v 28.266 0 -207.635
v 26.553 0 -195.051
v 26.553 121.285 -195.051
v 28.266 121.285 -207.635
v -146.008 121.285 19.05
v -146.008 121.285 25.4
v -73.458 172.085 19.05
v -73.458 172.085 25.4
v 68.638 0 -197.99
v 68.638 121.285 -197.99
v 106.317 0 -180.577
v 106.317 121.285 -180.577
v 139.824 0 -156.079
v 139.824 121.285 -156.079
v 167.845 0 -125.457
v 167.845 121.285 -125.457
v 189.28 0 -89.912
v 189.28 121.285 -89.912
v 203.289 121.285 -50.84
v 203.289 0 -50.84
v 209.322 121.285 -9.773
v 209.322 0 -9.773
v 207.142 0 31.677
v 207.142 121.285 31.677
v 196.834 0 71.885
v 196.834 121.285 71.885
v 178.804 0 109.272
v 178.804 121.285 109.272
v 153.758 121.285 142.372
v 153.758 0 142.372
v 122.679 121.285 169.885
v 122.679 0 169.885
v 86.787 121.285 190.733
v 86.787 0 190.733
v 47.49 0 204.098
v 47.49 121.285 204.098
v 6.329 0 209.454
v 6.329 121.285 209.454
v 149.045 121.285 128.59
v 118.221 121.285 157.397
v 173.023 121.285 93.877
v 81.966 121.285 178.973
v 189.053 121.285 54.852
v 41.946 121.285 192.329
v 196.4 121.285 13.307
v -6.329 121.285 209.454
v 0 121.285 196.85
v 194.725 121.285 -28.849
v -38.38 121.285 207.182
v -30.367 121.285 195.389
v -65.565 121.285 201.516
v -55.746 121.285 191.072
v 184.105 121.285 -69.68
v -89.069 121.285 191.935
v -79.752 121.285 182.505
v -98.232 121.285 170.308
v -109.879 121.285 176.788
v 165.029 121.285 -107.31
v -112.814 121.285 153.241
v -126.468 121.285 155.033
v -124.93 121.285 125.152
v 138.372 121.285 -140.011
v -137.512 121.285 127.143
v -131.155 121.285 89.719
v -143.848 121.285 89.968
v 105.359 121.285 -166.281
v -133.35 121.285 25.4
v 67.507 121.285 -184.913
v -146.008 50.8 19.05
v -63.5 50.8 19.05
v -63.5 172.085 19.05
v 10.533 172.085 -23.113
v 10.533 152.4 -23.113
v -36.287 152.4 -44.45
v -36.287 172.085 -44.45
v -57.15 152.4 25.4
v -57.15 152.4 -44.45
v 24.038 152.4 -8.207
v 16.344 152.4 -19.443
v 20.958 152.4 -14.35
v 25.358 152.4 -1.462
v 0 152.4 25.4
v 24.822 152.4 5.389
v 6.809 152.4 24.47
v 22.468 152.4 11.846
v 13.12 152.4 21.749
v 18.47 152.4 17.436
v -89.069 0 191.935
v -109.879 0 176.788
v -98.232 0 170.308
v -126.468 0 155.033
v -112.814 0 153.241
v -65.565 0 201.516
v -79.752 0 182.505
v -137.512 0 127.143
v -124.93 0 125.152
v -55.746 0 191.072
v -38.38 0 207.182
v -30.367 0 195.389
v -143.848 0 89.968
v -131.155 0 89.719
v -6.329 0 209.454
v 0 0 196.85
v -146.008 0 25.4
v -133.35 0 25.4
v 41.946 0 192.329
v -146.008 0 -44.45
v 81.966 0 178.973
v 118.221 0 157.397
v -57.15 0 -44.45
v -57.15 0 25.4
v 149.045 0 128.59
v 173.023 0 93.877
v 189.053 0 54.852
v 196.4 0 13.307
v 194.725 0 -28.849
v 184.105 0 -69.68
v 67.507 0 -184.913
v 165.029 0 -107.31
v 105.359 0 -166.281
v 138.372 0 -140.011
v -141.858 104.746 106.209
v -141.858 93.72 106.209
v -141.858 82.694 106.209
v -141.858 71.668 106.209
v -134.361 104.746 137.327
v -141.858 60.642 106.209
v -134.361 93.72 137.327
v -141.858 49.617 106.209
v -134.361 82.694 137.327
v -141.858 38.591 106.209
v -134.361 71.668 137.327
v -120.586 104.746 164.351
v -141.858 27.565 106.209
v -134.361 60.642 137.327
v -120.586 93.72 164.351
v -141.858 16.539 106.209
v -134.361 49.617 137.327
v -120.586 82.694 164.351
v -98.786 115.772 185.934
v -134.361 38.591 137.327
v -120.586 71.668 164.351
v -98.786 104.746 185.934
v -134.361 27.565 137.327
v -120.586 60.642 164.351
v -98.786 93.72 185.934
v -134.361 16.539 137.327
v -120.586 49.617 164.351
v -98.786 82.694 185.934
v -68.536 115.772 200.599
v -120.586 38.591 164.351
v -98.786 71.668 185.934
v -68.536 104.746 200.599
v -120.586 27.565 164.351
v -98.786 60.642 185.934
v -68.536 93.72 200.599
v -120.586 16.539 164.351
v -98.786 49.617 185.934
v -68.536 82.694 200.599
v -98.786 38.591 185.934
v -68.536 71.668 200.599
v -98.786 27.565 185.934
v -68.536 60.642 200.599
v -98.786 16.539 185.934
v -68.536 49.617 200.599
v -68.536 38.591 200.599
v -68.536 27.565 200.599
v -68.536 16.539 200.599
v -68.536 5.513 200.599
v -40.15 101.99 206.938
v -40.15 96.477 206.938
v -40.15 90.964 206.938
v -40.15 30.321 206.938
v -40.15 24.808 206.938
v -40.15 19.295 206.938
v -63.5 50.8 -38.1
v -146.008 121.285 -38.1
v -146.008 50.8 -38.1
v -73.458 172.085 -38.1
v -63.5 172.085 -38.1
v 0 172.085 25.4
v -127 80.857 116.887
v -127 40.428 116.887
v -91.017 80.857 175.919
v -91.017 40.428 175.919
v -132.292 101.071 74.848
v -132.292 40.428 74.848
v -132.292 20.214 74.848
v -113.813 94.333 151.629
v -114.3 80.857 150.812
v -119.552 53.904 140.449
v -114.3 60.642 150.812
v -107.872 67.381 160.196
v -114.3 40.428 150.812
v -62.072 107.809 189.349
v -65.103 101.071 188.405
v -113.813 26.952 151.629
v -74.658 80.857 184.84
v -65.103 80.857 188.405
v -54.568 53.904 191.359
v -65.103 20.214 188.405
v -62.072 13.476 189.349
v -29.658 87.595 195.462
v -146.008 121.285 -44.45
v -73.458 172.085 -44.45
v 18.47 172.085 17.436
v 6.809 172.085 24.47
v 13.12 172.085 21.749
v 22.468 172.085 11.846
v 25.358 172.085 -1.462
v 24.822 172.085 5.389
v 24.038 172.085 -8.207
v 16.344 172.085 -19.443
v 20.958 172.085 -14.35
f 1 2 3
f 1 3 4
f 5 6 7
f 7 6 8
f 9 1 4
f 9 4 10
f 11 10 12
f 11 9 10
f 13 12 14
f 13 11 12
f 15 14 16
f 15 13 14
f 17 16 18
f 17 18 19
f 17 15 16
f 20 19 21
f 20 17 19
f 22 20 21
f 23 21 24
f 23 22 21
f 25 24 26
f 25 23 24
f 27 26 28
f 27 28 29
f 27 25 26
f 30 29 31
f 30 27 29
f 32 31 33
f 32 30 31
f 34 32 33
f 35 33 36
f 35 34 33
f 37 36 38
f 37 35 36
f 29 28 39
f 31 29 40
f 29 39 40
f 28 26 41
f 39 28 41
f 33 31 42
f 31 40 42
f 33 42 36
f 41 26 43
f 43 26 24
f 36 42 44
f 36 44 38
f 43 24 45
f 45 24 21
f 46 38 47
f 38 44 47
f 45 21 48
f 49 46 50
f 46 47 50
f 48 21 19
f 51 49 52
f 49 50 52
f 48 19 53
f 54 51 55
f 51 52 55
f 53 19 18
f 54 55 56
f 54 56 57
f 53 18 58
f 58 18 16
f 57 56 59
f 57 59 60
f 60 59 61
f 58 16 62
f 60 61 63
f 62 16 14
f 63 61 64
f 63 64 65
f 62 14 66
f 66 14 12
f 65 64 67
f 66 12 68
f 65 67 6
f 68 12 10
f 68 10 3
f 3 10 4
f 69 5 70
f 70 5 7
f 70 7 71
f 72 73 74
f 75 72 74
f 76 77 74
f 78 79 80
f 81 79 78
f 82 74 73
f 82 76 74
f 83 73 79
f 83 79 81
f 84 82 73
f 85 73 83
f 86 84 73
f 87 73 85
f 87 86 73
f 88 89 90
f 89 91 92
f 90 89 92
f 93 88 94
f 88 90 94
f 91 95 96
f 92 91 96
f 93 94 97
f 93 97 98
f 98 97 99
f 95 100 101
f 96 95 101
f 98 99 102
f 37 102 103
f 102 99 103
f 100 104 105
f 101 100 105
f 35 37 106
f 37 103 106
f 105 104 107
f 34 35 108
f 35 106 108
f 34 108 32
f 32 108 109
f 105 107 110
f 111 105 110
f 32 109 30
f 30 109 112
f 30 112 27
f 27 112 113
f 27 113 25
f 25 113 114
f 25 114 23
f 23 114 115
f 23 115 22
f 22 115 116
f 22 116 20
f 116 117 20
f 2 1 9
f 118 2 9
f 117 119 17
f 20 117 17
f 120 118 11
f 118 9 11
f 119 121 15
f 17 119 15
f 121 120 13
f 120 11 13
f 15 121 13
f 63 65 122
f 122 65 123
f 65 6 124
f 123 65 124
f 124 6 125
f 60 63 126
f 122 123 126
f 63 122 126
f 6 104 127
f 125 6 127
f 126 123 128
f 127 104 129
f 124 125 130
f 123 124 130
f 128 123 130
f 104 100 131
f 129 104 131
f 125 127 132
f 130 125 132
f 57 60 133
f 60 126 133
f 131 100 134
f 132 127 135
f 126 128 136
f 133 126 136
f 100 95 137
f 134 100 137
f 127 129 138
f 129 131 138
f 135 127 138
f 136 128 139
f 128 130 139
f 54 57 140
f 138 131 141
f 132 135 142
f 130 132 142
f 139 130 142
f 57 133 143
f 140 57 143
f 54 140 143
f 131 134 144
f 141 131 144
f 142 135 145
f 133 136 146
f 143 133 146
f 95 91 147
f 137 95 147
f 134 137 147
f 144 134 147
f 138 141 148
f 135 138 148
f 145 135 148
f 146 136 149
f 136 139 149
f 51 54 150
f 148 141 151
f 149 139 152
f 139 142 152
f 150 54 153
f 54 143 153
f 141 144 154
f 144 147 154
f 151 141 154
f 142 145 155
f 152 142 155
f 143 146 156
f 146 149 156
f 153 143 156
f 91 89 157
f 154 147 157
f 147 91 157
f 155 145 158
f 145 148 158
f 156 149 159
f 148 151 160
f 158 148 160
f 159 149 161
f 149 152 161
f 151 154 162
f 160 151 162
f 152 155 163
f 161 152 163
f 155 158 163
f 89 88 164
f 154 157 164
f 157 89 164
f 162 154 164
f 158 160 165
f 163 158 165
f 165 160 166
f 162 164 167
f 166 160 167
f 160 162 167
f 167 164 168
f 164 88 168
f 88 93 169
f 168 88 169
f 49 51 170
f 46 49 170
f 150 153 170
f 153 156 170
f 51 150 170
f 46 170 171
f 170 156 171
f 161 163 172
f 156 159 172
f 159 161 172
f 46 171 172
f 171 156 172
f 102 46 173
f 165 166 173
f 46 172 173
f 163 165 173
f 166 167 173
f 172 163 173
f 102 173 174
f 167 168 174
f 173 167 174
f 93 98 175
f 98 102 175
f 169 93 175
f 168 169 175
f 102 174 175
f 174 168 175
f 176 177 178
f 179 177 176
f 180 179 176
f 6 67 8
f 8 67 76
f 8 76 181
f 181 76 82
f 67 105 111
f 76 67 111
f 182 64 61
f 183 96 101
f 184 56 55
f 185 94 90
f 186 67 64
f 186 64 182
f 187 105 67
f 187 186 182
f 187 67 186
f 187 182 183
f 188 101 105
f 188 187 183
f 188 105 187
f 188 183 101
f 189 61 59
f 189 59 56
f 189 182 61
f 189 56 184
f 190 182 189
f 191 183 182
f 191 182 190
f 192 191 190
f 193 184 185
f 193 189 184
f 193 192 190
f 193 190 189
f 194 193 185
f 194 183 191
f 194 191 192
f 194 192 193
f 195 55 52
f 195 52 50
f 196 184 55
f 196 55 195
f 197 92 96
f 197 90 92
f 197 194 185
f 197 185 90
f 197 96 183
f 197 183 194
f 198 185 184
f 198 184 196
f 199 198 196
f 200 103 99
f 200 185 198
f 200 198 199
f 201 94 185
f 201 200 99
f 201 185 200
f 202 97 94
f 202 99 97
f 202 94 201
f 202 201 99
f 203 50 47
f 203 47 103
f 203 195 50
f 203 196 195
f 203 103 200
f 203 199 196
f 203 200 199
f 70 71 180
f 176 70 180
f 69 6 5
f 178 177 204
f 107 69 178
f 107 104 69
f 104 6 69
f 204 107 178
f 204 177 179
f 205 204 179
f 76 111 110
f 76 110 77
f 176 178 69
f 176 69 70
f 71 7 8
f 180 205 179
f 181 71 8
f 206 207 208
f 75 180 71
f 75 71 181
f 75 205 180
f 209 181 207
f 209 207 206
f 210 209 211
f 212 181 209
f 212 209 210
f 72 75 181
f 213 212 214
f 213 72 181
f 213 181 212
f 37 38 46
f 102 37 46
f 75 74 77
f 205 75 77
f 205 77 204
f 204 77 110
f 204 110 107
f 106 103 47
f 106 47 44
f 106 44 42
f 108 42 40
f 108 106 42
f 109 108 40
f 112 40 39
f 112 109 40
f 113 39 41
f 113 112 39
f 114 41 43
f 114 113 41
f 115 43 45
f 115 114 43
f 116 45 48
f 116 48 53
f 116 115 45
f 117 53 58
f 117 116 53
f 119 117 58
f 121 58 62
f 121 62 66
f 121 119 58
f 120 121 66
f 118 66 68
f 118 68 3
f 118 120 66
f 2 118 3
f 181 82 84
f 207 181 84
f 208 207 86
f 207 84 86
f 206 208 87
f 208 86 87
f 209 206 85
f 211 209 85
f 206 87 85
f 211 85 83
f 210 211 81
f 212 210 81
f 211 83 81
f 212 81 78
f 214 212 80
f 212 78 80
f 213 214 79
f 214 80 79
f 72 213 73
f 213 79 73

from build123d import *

# Parameters (mm, degrees)
BASE_EXTRUDE_DEPTH           = 121.285
SKETCH3_4_W                  = 12.658404279
SKETCH3_4_H                  = 69.85
MOTOR_BOX_CORE_SUPPORT_DEPTH = 172.085
WHEEL_SPACE_REACH            = 359.533
SKETCH4_W                    = 82.55
SKETCH4_H                    = 152.4
SKETCH5_W                    = 82.508404279
SKETCH5_H                    = 57.15
MOTOR_SPACE_DEPTH            = 121.285
MOTOR_SPACE_RIBS_DEPTH       = 358.532752856


with BuildPart() as part:
    # Sketch3 → Base extrude (new body)
    with BuildSketch(Plane(origin=(0, 0, 0), x_dir=(1, 0, 0), z_dir=(0, 1, 0))):
        with BuildLine():
            Line((26.55331123, 195.050875832), (28.266428083, 207.634803305))
            ThreePointArc((28.266428083, 207.634803305), (209.260756715, -11.006279992), (6.329202139, -209.454395276))
            Line((6.329202139, -209.454395276), (-6.329202139, -209.454395276))
            add(Edge.make_bspline(
                [(-146.008404279, -25.4), (-146.008404279, -25.825184703), (-146.008186701, -28.390264622), (-145.992828986, -37.675812079), (-145.847861717, -52.813230692), (-145.252148771, -71.571281929), (-144.048815033, -89.419368639), (-142.031880927, -106.362231784), (-137.954990072, -127.728726744), (-131.289734266, -147.26224301), (-120.928636207, -164.576629863), (-111.101066218, -176.207339111), (-99.137557526, -186.230706711), (-85.06323068, -194.472251254), (-71.591092365, -199.823977742), (-59.732617944, -203.218129468), (-50.280608969, -205.32790847), (-40.250071446, -207.008611147), (-31.389652459, -208.056286946), (-23.987147203, -208.684629614), (-18.276024056, -209.051283621), (-13.377371895, -209.269931643), (-9.381928102, -209.392630987), (-7.343469775, -209.4368391), (-6.329202139, -209.454395276)],
                knots=[0, 0, 0, 0, 0.003998364, 0.024104834, 0.088078657, 0.152052481, 0.216026304, 0.280000128, 0.343973951, 0.471921599, 0.535895422, 0.599869246, 0.663843069, 0.727816893, 0.791790716, 0.823777628, 0.85576454, 0.887751452, 0.919738363, 0.935731819, 0.951725275, 0.967718731, 0.975715459, 0.983712187, 0.983712187, 0.983712187, 0.983712187], degree=3))
            Line((-146.008404279, -25.4), (-133.35, -25.4))
            add(Edge.make_bspline(
                [(-133.35, -25.4), (-133.35, -131.233333333), (-127, -196.85), (0, -196.85)],
                knots=[0, 0, 0, 0, 1, 1, 1, 1], degree=3))
            ThreePointArc((0, -196.85), (196.39970393, -13.307095711), (26.55331123, 195.050875832))
        make_face()
    extrude(amount=BASE_EXTRUDE_DEPTH)

    # Sketch3<4> → Motor box & Core support (add)
    with BuildSketch(Plane(origin=(0, 0, 0), x_dir=(1, 0, 0), z_dir=(0, 1, 0))):
        with Locations((-139.67920214, 9.525)):
            Rectangle(SKETCH3_4_W, SKETCH3_4_H)
        with BuildLine():
            Line((-133.35, 44.45), (-133.35, -25.4))
            Line((-133.35, -25.4), (0, -25.4))
            ThreePointArc((0, -25.4), (24.821670104, -5.389312873), (10.533208363, 23.11301628))
            Line((10.533208363, 23.11301628), (-36.286529277, 44.45))
            Line((-36.286529277, 44.45), (-133.35, 44.45))
        make_face()
    extrude(amount=MOTOR_BOX_CORE_SUPPORT_DEPTH)

    # Sketch4 → Wheel space (cut, up to next)
    with BuildSketch(Plane.XY.offset(25.4), mode=Mode.PRIVATE) as wheel_space_sk1:
        with Locations((-15.875, 76.2)):
            Rectangle(SKETCH4_W, SKETCH4_H)
    wheel_space_tool1 = extrude(wheel_space_sk1.sketch, amount=-WHEEL_SPACE_REACH, mode=Mode.PRIVATE) & part.part
    add(wheel_space_tool1.solids().sort_by_distance((-15.875, 76.2, 25.4))[0], mode=Mode.SUBTRACT)

    # Sketch5 → Motor space (cut)
    with BuildSketch(Plane(origin=(0, 172.085, 0), x_dir=(1, 0, 0), z_dir=(0, 1, 0))):
        with Locations((-104.75420214, 9.525)):
            Rectangle(SKETCH5_W, SKETCH5_H)
    extrude(amount=-MOTOR_SPACE_DEPTH, mode=Mode.SUBTRACT)

    # Sketch6 → Motor Space Ribs (cut, through all)
    with BuildSketch(Plane.XY.offset(25.4)):
        Polygon((-146.008404279, 121.285), (-73.458485536, 172.085), (-146.008404279, 172.085), align=None)
    extrude(amount=-MOTOR_SPACE_RIBS_DEPTH, mode=Mode.SUBTRACT)


solid = part.part
